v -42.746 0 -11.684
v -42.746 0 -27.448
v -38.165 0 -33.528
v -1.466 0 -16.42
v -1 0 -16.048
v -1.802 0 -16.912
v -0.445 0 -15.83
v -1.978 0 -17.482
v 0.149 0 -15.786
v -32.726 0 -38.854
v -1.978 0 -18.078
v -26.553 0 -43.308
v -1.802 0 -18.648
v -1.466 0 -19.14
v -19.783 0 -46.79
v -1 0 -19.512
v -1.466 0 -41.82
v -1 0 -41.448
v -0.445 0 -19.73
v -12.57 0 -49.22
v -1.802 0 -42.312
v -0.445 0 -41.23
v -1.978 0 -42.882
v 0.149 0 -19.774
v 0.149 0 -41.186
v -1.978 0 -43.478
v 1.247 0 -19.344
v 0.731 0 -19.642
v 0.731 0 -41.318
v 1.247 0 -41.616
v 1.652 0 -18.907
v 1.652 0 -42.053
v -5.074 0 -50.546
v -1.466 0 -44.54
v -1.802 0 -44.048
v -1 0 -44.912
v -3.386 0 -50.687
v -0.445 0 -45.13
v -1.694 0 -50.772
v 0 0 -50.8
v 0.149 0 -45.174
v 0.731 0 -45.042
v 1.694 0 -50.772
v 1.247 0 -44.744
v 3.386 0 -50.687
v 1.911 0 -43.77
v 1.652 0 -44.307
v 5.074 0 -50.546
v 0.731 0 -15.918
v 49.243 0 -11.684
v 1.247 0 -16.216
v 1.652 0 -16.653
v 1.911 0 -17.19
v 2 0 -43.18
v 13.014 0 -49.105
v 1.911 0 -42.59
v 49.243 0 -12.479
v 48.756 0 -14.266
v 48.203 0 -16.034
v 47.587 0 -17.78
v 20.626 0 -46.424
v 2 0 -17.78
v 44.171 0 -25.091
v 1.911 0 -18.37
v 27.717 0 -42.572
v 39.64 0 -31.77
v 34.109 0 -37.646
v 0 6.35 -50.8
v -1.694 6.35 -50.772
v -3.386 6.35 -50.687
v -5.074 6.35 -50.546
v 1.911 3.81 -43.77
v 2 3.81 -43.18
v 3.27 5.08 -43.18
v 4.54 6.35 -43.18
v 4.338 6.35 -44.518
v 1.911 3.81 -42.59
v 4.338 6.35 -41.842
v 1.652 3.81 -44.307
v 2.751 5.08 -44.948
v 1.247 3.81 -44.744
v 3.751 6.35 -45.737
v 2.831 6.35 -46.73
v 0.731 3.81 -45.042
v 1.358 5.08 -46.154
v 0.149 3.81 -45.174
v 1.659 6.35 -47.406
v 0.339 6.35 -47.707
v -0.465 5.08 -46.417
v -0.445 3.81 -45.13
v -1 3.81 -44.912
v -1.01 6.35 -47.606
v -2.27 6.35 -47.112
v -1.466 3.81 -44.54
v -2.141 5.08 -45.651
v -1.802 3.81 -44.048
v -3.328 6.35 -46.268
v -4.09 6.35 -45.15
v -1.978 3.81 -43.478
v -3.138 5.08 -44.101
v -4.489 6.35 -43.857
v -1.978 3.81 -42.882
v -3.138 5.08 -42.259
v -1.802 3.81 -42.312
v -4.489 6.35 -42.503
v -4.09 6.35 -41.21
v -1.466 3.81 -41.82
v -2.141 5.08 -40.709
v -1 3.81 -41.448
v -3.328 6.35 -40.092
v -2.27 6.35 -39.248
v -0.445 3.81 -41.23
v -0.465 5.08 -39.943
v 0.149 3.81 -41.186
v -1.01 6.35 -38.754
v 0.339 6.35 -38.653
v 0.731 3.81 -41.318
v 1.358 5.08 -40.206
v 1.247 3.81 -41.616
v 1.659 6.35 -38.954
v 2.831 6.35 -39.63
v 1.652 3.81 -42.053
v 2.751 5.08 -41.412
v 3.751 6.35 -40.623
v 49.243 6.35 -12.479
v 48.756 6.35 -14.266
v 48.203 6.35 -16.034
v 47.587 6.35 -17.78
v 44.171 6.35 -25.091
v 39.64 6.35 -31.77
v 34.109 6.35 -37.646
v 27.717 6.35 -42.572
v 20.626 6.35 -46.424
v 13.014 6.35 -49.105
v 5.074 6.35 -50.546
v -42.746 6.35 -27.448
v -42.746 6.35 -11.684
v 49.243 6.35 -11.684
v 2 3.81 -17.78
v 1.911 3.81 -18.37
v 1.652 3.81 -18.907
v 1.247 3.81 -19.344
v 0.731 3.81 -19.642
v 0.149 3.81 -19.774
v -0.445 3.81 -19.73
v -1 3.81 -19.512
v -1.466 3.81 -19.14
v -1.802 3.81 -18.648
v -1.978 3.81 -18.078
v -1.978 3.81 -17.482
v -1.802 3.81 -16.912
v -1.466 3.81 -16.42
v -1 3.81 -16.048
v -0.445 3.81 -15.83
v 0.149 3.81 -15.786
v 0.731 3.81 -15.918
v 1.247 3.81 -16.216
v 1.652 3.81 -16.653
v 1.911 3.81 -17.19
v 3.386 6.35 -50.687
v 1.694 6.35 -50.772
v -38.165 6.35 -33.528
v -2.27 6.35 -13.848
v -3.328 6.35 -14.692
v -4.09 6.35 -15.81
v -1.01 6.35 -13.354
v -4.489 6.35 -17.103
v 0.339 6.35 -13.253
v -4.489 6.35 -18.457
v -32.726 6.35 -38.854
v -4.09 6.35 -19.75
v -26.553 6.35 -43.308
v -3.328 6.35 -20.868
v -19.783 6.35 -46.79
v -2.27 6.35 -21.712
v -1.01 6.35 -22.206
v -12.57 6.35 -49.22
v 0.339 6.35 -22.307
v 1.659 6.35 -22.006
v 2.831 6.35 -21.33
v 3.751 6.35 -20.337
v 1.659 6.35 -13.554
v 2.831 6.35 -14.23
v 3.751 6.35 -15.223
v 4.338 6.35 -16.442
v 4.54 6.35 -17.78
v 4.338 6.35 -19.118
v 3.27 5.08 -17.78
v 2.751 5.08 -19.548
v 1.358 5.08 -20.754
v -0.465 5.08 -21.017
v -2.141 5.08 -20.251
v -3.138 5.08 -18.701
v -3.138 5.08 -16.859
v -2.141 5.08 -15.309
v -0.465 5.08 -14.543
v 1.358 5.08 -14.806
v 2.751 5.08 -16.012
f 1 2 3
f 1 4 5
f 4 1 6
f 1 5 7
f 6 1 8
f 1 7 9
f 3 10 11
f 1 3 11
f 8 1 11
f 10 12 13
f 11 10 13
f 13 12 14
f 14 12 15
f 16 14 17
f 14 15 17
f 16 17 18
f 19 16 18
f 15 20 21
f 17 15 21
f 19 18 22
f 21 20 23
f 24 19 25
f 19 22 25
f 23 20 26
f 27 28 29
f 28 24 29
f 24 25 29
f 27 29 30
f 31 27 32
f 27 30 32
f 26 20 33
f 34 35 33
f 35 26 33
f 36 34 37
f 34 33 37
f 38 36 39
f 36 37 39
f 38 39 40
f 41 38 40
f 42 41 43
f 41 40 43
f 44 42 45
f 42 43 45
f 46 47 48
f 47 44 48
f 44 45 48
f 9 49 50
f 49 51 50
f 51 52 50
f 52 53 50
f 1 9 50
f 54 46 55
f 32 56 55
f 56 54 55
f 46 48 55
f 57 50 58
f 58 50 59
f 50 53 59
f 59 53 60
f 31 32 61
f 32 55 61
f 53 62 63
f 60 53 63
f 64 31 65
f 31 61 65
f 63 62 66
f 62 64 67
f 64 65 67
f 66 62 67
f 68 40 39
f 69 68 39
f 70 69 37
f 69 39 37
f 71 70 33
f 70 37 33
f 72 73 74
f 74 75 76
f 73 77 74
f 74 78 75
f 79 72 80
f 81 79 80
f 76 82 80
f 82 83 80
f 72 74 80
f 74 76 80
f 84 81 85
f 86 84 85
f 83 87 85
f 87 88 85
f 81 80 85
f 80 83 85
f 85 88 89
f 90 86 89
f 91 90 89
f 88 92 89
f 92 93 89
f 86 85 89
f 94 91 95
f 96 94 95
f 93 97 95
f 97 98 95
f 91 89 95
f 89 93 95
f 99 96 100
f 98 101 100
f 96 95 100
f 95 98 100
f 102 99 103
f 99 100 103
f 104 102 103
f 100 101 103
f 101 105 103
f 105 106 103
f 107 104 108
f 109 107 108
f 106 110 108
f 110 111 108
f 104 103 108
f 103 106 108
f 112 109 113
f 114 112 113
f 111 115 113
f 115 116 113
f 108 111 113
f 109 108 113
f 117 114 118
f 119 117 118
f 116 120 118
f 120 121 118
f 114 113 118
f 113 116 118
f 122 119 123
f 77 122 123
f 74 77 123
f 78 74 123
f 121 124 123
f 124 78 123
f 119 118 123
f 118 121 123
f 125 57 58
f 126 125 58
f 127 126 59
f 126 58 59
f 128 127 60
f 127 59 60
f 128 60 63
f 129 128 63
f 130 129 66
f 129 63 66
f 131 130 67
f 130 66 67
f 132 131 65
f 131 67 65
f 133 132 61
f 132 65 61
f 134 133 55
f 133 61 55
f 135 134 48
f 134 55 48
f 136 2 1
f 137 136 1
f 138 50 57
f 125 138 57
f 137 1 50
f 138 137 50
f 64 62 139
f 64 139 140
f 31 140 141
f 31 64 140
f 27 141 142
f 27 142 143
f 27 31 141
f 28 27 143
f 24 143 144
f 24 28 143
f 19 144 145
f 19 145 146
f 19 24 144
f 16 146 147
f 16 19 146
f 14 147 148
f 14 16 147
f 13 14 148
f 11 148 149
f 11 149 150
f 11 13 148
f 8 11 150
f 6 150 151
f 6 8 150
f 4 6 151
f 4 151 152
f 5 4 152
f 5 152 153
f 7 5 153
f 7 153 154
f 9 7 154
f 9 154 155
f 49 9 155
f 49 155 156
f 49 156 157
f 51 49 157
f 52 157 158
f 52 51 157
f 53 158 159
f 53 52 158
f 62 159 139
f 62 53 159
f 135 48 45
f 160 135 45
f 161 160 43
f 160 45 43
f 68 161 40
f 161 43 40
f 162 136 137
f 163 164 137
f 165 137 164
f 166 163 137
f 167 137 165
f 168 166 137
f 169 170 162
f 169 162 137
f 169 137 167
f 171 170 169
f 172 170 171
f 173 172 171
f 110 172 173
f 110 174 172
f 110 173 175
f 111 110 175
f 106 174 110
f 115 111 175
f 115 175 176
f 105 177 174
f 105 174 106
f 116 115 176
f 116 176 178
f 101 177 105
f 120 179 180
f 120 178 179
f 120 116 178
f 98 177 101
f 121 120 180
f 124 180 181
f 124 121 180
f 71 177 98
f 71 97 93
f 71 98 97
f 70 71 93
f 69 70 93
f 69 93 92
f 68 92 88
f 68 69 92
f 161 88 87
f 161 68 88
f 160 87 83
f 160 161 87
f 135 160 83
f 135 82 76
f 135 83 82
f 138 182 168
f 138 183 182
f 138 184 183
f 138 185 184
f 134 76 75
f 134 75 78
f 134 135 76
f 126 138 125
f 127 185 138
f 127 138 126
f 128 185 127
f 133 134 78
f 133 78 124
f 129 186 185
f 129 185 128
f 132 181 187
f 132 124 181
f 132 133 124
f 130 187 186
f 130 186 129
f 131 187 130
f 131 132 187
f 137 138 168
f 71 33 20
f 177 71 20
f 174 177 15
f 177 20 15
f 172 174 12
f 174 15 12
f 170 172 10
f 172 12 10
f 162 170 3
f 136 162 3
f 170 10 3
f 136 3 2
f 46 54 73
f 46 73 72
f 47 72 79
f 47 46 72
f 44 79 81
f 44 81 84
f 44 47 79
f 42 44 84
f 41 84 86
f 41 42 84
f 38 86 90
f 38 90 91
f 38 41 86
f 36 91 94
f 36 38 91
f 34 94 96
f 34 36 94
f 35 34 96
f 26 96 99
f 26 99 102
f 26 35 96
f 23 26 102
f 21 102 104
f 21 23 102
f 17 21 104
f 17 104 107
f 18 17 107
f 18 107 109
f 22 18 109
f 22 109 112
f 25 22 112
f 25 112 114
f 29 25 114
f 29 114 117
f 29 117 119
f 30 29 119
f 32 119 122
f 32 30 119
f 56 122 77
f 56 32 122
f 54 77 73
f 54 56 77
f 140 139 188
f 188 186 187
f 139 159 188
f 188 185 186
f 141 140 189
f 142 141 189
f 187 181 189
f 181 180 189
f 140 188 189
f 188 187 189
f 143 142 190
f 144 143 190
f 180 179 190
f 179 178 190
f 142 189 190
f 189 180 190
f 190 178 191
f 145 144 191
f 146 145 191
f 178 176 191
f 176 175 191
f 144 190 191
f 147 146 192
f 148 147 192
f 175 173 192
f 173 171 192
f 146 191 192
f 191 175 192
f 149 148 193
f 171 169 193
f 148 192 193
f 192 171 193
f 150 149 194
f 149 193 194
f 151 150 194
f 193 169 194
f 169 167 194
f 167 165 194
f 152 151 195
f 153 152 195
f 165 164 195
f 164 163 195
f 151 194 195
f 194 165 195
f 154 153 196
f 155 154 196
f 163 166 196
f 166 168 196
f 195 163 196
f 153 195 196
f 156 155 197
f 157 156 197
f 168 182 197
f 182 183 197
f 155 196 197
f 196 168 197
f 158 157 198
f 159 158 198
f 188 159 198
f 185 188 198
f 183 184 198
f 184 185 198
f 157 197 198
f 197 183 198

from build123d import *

# Parameters (mm, degrees)
SKETCH1_R           = 2
BOSS_EXTRUDE1_DEPTH = 6.35
CHAMFER1_SIZE       = 2.54


with BuildPart() as part:
    # Sketch1 → Boss-Extrude1 (new body)
    with BuildSketch(Plane(origin=(0, 0, 0), x_dir=(1, 0, 0), z_dir=(0, 1, 0))):
        with BuildLine():
            Line((-42.746, 11.684), (47.586884748, 11.684))
            Line((47.586884748, 11.684), (47.586884748, 17.78))
            ThreePointArc((47.586884748, 17.78), (31.011055518, 40.236232871), (5.073646026, 50.546))
            Line((5.073646026, 50.546), (-5.073646026, 50.546))
            ThreePointArc((-5.073646026, 50.546), (-26.552841725, 43.308043091), (-42.746, 27.448487827))
            Line((-42.746, 27.448487827), (-42.746, 11.684))
        make_face()
        with Locations((0, 17.78)):
            Circle(SKETCH1_R, mode=Mode.SUBTRACT)
        with Locations((0, 43.18)):
            Circle(SKETCH1_R, mode=Mode.SUBTRACT)
        with BuildLine():
            Line((47.586884748, 17.78), (47.586884748, 11.684))
            Line((47.586884748, 11.684), (49.243425186, 11.684))
            Line((49.243425186, 11.684), (49.243425186, 12.478985375))
            ThreePointArc((49.243425186, 12.478985375), (48.487652237, 15.15214772), (47.586884748, 17.78))
        make_face()
        with BuildLine():
            Line((-5.073646026, 50.546), (5.073646026, 50.546))
            ThreePointArc((5.073646026, 50.546), (2.539999948, 50.736460265), (-1.05e-07, 50.8))
            ThreePointArc((-1.05e-07, 50.8), (-2.540000052, 50.73646026), (-5.073646026, 50.546))
        make_face()
    extrude(amount=BOSS_EXTRUDE1_DEPTH)

    # Chamfer1
    chamfer1_edges = [part.edges().sort_by_distance(p)[0] for p in [
        (-2, 6.35, -17.78),
        (-2, 6.35, -43.18),
    ]]
    chamfer(chamfer1_edges, length=CHAMFER1_SIZE)


solid = part.part
